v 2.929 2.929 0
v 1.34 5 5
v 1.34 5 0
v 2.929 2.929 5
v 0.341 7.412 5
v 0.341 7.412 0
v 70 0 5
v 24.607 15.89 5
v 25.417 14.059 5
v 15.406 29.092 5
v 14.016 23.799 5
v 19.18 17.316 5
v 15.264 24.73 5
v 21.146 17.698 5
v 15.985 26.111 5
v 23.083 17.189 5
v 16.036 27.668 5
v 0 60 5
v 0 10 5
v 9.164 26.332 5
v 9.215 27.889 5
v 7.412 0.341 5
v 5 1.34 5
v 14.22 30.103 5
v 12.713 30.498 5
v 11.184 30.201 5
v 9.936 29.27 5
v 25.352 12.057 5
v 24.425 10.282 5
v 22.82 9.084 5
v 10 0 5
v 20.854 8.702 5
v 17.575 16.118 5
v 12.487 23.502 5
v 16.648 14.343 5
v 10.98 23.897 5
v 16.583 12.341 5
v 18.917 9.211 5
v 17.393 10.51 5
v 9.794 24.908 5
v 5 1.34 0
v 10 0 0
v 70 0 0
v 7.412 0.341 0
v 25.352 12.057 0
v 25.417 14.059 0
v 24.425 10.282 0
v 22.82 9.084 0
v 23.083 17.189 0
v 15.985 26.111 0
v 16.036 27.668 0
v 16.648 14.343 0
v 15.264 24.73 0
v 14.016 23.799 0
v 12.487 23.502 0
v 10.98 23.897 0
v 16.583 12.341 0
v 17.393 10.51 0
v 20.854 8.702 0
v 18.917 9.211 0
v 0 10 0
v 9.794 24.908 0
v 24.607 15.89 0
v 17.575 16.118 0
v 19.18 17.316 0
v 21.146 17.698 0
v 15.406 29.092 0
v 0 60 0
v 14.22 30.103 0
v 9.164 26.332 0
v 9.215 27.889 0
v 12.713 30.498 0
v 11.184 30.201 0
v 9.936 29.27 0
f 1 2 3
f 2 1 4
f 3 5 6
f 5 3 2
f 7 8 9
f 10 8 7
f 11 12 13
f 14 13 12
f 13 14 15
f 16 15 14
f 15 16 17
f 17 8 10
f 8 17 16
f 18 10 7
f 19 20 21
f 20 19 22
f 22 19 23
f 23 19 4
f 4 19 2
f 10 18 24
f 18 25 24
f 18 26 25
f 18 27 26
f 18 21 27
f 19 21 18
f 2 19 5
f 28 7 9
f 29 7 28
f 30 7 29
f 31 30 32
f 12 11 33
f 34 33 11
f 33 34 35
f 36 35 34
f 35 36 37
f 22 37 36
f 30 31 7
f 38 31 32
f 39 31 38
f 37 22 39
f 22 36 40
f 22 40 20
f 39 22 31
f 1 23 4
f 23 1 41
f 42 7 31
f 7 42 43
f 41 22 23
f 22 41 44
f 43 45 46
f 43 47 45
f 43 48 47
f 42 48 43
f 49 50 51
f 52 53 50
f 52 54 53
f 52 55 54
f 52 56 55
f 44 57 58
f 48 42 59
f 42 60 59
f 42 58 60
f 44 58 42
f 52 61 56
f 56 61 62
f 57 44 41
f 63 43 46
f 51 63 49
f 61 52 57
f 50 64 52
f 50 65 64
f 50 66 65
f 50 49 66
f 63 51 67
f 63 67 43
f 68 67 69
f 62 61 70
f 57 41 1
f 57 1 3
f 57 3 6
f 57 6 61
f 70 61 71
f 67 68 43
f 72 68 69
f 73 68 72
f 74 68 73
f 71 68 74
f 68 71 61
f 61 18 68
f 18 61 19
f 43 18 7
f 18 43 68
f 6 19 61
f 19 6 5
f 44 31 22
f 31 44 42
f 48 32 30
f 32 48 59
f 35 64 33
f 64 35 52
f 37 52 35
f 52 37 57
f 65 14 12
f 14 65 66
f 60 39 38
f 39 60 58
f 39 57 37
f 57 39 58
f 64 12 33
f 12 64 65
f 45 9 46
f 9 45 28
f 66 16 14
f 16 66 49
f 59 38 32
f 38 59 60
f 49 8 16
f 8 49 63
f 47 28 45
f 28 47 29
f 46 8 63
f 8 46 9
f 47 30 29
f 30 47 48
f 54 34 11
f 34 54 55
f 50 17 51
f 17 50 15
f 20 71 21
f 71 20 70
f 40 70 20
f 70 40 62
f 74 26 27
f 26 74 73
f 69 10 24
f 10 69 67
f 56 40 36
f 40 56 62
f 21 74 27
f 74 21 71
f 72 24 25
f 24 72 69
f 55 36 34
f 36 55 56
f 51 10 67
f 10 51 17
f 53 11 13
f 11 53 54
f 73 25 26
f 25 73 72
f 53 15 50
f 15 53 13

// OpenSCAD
$fn = 32;

// ----------------------------------------------------------------------
// Bracket plate: corner pad 70 x 60, fillet R10
// ----------------------------------------------------------------------

// --- parameters (mm) ---
hole_r = 3.5;             // bolt hole radius
plate_t = 5;              // plate thickness, Z (extrusion height)
leg_a = 70;               // base leg
leg_b = 60;               // height leg
fillet_r = 10;            // right-angle fillet radius

hole_d1 = 2 * hole_r + 2;
hole_d2 = 2 * hole_r;

profile = [[10, 0], [70, 0], [0, 60], [0, 10], [0.341, 7.412], [1.34, 5], [2.929, 2.929], [5, 1.34], [7.412, 0.341]];  // primary outline, 9 points, counter clockwise
void_1 = [[25.417, 14.059], [24.607, 15.89], [23.083, 17.189], [21.146, 17.698], [19.18, 17.316], [17.575, 16.118], [16.648, 14.343], [16.583, 12.341], [17.393, 10.51], [18.917, 9.211], [20.854, 8.702], [22.82, 9.084], [24.425, 10.282], [25.352, 12.057]];  // mount hole 1, 14 points
void_2 = [[16.036, 27.668], [15.406, 29.092], [14.22, 30.103], [12.713, 30.498], [11.184, 30.201], [9.936, 29.27], [9.215, 27.889], [9.164, 26.332], [9.794, 24.908], [10.98, 23.897], [12.487, 23.502], [14.016, 23.799], [15.264, 24.73], [15.985, 26.111]];  // mount hole 2, 14 points

// --- the one profile operation ---
difference() {
  linear_extrude(height = plate_t) polygon(points = profile);
  translate([0, 0, -1])
    linear_extrude(height = plate_t + 2) polygon(points = void_1);
  translate([0, 0, -1])
    linear_extrude(height = plate_t + 2) polygon(points = void_2);
}
